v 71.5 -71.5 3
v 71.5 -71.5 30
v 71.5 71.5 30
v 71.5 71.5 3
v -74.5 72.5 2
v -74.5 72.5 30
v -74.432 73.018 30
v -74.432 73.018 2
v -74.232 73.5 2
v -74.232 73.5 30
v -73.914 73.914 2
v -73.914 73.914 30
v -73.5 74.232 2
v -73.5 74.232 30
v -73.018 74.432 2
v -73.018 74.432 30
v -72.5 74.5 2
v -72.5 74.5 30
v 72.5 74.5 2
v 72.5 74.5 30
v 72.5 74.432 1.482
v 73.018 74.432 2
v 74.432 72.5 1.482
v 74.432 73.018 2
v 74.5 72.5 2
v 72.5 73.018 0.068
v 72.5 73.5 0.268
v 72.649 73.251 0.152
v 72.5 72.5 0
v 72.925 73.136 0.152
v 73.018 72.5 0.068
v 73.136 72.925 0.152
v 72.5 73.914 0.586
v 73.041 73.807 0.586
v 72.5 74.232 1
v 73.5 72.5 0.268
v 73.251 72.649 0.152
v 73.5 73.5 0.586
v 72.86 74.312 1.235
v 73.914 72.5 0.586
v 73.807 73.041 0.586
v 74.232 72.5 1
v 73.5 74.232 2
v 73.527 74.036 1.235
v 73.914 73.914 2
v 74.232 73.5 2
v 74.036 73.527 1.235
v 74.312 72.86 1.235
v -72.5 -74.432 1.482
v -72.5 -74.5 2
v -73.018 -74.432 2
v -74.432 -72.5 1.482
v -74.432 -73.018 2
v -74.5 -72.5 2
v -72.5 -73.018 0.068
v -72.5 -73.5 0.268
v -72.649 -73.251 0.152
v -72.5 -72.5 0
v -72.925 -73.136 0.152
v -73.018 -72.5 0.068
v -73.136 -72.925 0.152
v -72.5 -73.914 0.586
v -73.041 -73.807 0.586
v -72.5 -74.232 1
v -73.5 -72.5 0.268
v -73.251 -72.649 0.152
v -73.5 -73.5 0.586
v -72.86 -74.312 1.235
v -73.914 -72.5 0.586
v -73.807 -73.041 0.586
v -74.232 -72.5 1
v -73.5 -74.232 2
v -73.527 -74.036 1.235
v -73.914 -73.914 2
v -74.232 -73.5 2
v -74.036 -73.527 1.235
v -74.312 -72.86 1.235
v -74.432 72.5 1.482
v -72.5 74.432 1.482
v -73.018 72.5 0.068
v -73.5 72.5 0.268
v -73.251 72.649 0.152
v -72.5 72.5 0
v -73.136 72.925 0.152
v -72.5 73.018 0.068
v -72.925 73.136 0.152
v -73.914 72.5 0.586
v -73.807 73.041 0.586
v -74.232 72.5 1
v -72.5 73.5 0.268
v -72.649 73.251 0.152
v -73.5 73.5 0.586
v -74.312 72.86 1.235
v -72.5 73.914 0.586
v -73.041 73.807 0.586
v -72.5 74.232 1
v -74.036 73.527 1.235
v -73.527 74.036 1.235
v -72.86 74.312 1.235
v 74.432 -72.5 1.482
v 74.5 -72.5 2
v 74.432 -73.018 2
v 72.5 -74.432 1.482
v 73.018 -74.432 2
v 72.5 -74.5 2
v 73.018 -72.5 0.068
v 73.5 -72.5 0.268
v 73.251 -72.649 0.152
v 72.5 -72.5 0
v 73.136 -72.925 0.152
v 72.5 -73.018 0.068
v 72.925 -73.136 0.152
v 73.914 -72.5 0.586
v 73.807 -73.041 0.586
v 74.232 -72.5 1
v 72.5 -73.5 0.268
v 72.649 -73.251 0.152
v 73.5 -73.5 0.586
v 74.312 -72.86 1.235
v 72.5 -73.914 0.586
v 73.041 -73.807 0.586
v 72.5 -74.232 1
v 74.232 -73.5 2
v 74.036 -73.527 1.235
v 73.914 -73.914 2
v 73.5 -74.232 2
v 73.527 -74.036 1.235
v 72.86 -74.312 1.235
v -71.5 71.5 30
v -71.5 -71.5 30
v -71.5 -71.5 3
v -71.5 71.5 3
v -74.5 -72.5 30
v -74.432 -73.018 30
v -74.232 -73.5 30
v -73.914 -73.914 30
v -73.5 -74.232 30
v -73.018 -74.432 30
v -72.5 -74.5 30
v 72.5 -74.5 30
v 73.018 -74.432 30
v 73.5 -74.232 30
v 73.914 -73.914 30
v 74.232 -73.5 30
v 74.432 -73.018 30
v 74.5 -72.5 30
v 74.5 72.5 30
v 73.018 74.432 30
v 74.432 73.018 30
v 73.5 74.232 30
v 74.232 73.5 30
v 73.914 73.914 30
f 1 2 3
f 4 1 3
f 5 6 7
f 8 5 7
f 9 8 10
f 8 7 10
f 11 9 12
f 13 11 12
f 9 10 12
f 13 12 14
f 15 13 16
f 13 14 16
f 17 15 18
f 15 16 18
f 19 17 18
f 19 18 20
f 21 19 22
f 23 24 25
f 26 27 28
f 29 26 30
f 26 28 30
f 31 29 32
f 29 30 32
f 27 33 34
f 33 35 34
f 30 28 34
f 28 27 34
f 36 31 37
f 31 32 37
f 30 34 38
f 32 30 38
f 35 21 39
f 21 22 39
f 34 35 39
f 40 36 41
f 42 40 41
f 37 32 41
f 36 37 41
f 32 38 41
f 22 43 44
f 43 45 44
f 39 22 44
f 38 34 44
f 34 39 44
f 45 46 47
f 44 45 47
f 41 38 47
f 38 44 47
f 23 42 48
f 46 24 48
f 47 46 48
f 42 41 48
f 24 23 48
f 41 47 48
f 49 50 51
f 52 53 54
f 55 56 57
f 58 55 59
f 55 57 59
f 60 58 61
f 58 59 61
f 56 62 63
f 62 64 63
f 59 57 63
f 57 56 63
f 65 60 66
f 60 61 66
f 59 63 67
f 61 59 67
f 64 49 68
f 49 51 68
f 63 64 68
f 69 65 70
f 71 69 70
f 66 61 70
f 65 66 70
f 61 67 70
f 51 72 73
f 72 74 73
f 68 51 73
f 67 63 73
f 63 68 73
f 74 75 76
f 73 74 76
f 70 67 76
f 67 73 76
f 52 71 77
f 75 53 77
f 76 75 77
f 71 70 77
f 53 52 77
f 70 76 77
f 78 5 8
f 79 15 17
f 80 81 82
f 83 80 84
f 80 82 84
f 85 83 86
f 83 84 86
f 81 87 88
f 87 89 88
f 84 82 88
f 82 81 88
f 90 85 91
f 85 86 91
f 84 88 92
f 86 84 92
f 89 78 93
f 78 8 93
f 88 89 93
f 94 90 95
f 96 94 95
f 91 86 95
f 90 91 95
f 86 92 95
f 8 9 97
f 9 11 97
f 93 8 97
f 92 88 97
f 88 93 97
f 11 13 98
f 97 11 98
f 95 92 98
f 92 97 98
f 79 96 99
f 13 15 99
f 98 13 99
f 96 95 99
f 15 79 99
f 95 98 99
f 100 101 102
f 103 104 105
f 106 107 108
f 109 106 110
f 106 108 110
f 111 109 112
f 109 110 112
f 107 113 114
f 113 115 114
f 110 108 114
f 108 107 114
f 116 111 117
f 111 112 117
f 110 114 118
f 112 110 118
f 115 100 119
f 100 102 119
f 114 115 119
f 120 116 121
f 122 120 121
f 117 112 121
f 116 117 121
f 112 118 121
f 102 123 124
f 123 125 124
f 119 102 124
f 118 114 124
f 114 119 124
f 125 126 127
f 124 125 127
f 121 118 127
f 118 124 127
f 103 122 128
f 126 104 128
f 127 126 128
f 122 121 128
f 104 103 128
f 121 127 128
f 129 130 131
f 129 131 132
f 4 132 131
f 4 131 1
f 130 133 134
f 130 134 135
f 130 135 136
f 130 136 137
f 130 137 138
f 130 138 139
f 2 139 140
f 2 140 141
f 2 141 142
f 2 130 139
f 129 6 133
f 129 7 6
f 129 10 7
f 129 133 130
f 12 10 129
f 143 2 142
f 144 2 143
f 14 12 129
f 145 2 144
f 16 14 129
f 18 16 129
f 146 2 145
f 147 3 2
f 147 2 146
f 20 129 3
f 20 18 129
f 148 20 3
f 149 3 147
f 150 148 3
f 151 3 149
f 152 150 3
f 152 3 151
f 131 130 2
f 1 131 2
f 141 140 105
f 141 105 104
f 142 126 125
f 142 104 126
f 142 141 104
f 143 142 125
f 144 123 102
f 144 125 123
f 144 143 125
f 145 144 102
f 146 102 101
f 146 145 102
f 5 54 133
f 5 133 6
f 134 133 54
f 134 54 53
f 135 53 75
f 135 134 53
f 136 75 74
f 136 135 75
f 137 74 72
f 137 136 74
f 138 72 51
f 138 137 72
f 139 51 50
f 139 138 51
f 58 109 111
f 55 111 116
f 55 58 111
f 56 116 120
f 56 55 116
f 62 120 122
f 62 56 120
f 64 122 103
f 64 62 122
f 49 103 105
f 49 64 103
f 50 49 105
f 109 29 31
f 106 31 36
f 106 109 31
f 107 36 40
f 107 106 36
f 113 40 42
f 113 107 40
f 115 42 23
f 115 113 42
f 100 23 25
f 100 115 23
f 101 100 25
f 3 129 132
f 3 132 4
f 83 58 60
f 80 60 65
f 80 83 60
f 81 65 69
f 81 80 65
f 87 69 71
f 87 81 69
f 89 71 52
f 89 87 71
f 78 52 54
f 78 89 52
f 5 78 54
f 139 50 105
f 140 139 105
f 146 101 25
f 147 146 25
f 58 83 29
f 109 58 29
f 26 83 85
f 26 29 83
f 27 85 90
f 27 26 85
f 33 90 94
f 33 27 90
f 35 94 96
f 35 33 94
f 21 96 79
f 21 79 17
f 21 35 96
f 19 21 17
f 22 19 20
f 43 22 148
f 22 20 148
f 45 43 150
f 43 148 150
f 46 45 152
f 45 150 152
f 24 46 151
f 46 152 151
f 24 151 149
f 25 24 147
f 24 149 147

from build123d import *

# Parameters (mm, degrees)
SKETCH_W     = 149
SKETCH_H     = 149
PAD_DEPTH    = 30
SKETCH001_W  = 143
SKETCH001_H  = 143
POCKET_DEPTH = 27
FILLET_R     = 2
FILLET001_R  = 2


with BuildPart() as part:
    # Sketch → Pad (new body)
    with BuildSketch(Plane.XY):
        Rectangle(SKETCH_W, SKETCH_H)
    extrude(amount=PAD_DEPTH)

    # Sketch001 (on Face6 of Pad) → Pocket (cut)
    with BuildSketch(Plane.XY.offset(30)):
        Rectangle(SKETCH001_W, SKETCH001_H)
    extrude(amount=-POCKET_DEPTH, mode=Mode.SUBTRACT)

    # Fillet
    fillet_edges = [part.edges().sort_by_distance(p)[0] for p in [
        (74.5, -74.5, 15),
        (-74.5, -74.5, 15),
        (74.5, 74.5, 15),
        (-74.5, 74.5, 15),
    ]]
    fillet(fillet_edges, radius=FILLET_R)

    # Fillet001
    fillet001_edges = [part.edges().sort_by_distance(p)[0] for p in [
        (0, 74.5, 0),
        (-74.5, 0, 0),
        (0, -74.5, 0),
        (74.5, 0, 0),
    ]]
    fillet(fillet001_edges, radius=FILLET001_R)


solid = part.part
